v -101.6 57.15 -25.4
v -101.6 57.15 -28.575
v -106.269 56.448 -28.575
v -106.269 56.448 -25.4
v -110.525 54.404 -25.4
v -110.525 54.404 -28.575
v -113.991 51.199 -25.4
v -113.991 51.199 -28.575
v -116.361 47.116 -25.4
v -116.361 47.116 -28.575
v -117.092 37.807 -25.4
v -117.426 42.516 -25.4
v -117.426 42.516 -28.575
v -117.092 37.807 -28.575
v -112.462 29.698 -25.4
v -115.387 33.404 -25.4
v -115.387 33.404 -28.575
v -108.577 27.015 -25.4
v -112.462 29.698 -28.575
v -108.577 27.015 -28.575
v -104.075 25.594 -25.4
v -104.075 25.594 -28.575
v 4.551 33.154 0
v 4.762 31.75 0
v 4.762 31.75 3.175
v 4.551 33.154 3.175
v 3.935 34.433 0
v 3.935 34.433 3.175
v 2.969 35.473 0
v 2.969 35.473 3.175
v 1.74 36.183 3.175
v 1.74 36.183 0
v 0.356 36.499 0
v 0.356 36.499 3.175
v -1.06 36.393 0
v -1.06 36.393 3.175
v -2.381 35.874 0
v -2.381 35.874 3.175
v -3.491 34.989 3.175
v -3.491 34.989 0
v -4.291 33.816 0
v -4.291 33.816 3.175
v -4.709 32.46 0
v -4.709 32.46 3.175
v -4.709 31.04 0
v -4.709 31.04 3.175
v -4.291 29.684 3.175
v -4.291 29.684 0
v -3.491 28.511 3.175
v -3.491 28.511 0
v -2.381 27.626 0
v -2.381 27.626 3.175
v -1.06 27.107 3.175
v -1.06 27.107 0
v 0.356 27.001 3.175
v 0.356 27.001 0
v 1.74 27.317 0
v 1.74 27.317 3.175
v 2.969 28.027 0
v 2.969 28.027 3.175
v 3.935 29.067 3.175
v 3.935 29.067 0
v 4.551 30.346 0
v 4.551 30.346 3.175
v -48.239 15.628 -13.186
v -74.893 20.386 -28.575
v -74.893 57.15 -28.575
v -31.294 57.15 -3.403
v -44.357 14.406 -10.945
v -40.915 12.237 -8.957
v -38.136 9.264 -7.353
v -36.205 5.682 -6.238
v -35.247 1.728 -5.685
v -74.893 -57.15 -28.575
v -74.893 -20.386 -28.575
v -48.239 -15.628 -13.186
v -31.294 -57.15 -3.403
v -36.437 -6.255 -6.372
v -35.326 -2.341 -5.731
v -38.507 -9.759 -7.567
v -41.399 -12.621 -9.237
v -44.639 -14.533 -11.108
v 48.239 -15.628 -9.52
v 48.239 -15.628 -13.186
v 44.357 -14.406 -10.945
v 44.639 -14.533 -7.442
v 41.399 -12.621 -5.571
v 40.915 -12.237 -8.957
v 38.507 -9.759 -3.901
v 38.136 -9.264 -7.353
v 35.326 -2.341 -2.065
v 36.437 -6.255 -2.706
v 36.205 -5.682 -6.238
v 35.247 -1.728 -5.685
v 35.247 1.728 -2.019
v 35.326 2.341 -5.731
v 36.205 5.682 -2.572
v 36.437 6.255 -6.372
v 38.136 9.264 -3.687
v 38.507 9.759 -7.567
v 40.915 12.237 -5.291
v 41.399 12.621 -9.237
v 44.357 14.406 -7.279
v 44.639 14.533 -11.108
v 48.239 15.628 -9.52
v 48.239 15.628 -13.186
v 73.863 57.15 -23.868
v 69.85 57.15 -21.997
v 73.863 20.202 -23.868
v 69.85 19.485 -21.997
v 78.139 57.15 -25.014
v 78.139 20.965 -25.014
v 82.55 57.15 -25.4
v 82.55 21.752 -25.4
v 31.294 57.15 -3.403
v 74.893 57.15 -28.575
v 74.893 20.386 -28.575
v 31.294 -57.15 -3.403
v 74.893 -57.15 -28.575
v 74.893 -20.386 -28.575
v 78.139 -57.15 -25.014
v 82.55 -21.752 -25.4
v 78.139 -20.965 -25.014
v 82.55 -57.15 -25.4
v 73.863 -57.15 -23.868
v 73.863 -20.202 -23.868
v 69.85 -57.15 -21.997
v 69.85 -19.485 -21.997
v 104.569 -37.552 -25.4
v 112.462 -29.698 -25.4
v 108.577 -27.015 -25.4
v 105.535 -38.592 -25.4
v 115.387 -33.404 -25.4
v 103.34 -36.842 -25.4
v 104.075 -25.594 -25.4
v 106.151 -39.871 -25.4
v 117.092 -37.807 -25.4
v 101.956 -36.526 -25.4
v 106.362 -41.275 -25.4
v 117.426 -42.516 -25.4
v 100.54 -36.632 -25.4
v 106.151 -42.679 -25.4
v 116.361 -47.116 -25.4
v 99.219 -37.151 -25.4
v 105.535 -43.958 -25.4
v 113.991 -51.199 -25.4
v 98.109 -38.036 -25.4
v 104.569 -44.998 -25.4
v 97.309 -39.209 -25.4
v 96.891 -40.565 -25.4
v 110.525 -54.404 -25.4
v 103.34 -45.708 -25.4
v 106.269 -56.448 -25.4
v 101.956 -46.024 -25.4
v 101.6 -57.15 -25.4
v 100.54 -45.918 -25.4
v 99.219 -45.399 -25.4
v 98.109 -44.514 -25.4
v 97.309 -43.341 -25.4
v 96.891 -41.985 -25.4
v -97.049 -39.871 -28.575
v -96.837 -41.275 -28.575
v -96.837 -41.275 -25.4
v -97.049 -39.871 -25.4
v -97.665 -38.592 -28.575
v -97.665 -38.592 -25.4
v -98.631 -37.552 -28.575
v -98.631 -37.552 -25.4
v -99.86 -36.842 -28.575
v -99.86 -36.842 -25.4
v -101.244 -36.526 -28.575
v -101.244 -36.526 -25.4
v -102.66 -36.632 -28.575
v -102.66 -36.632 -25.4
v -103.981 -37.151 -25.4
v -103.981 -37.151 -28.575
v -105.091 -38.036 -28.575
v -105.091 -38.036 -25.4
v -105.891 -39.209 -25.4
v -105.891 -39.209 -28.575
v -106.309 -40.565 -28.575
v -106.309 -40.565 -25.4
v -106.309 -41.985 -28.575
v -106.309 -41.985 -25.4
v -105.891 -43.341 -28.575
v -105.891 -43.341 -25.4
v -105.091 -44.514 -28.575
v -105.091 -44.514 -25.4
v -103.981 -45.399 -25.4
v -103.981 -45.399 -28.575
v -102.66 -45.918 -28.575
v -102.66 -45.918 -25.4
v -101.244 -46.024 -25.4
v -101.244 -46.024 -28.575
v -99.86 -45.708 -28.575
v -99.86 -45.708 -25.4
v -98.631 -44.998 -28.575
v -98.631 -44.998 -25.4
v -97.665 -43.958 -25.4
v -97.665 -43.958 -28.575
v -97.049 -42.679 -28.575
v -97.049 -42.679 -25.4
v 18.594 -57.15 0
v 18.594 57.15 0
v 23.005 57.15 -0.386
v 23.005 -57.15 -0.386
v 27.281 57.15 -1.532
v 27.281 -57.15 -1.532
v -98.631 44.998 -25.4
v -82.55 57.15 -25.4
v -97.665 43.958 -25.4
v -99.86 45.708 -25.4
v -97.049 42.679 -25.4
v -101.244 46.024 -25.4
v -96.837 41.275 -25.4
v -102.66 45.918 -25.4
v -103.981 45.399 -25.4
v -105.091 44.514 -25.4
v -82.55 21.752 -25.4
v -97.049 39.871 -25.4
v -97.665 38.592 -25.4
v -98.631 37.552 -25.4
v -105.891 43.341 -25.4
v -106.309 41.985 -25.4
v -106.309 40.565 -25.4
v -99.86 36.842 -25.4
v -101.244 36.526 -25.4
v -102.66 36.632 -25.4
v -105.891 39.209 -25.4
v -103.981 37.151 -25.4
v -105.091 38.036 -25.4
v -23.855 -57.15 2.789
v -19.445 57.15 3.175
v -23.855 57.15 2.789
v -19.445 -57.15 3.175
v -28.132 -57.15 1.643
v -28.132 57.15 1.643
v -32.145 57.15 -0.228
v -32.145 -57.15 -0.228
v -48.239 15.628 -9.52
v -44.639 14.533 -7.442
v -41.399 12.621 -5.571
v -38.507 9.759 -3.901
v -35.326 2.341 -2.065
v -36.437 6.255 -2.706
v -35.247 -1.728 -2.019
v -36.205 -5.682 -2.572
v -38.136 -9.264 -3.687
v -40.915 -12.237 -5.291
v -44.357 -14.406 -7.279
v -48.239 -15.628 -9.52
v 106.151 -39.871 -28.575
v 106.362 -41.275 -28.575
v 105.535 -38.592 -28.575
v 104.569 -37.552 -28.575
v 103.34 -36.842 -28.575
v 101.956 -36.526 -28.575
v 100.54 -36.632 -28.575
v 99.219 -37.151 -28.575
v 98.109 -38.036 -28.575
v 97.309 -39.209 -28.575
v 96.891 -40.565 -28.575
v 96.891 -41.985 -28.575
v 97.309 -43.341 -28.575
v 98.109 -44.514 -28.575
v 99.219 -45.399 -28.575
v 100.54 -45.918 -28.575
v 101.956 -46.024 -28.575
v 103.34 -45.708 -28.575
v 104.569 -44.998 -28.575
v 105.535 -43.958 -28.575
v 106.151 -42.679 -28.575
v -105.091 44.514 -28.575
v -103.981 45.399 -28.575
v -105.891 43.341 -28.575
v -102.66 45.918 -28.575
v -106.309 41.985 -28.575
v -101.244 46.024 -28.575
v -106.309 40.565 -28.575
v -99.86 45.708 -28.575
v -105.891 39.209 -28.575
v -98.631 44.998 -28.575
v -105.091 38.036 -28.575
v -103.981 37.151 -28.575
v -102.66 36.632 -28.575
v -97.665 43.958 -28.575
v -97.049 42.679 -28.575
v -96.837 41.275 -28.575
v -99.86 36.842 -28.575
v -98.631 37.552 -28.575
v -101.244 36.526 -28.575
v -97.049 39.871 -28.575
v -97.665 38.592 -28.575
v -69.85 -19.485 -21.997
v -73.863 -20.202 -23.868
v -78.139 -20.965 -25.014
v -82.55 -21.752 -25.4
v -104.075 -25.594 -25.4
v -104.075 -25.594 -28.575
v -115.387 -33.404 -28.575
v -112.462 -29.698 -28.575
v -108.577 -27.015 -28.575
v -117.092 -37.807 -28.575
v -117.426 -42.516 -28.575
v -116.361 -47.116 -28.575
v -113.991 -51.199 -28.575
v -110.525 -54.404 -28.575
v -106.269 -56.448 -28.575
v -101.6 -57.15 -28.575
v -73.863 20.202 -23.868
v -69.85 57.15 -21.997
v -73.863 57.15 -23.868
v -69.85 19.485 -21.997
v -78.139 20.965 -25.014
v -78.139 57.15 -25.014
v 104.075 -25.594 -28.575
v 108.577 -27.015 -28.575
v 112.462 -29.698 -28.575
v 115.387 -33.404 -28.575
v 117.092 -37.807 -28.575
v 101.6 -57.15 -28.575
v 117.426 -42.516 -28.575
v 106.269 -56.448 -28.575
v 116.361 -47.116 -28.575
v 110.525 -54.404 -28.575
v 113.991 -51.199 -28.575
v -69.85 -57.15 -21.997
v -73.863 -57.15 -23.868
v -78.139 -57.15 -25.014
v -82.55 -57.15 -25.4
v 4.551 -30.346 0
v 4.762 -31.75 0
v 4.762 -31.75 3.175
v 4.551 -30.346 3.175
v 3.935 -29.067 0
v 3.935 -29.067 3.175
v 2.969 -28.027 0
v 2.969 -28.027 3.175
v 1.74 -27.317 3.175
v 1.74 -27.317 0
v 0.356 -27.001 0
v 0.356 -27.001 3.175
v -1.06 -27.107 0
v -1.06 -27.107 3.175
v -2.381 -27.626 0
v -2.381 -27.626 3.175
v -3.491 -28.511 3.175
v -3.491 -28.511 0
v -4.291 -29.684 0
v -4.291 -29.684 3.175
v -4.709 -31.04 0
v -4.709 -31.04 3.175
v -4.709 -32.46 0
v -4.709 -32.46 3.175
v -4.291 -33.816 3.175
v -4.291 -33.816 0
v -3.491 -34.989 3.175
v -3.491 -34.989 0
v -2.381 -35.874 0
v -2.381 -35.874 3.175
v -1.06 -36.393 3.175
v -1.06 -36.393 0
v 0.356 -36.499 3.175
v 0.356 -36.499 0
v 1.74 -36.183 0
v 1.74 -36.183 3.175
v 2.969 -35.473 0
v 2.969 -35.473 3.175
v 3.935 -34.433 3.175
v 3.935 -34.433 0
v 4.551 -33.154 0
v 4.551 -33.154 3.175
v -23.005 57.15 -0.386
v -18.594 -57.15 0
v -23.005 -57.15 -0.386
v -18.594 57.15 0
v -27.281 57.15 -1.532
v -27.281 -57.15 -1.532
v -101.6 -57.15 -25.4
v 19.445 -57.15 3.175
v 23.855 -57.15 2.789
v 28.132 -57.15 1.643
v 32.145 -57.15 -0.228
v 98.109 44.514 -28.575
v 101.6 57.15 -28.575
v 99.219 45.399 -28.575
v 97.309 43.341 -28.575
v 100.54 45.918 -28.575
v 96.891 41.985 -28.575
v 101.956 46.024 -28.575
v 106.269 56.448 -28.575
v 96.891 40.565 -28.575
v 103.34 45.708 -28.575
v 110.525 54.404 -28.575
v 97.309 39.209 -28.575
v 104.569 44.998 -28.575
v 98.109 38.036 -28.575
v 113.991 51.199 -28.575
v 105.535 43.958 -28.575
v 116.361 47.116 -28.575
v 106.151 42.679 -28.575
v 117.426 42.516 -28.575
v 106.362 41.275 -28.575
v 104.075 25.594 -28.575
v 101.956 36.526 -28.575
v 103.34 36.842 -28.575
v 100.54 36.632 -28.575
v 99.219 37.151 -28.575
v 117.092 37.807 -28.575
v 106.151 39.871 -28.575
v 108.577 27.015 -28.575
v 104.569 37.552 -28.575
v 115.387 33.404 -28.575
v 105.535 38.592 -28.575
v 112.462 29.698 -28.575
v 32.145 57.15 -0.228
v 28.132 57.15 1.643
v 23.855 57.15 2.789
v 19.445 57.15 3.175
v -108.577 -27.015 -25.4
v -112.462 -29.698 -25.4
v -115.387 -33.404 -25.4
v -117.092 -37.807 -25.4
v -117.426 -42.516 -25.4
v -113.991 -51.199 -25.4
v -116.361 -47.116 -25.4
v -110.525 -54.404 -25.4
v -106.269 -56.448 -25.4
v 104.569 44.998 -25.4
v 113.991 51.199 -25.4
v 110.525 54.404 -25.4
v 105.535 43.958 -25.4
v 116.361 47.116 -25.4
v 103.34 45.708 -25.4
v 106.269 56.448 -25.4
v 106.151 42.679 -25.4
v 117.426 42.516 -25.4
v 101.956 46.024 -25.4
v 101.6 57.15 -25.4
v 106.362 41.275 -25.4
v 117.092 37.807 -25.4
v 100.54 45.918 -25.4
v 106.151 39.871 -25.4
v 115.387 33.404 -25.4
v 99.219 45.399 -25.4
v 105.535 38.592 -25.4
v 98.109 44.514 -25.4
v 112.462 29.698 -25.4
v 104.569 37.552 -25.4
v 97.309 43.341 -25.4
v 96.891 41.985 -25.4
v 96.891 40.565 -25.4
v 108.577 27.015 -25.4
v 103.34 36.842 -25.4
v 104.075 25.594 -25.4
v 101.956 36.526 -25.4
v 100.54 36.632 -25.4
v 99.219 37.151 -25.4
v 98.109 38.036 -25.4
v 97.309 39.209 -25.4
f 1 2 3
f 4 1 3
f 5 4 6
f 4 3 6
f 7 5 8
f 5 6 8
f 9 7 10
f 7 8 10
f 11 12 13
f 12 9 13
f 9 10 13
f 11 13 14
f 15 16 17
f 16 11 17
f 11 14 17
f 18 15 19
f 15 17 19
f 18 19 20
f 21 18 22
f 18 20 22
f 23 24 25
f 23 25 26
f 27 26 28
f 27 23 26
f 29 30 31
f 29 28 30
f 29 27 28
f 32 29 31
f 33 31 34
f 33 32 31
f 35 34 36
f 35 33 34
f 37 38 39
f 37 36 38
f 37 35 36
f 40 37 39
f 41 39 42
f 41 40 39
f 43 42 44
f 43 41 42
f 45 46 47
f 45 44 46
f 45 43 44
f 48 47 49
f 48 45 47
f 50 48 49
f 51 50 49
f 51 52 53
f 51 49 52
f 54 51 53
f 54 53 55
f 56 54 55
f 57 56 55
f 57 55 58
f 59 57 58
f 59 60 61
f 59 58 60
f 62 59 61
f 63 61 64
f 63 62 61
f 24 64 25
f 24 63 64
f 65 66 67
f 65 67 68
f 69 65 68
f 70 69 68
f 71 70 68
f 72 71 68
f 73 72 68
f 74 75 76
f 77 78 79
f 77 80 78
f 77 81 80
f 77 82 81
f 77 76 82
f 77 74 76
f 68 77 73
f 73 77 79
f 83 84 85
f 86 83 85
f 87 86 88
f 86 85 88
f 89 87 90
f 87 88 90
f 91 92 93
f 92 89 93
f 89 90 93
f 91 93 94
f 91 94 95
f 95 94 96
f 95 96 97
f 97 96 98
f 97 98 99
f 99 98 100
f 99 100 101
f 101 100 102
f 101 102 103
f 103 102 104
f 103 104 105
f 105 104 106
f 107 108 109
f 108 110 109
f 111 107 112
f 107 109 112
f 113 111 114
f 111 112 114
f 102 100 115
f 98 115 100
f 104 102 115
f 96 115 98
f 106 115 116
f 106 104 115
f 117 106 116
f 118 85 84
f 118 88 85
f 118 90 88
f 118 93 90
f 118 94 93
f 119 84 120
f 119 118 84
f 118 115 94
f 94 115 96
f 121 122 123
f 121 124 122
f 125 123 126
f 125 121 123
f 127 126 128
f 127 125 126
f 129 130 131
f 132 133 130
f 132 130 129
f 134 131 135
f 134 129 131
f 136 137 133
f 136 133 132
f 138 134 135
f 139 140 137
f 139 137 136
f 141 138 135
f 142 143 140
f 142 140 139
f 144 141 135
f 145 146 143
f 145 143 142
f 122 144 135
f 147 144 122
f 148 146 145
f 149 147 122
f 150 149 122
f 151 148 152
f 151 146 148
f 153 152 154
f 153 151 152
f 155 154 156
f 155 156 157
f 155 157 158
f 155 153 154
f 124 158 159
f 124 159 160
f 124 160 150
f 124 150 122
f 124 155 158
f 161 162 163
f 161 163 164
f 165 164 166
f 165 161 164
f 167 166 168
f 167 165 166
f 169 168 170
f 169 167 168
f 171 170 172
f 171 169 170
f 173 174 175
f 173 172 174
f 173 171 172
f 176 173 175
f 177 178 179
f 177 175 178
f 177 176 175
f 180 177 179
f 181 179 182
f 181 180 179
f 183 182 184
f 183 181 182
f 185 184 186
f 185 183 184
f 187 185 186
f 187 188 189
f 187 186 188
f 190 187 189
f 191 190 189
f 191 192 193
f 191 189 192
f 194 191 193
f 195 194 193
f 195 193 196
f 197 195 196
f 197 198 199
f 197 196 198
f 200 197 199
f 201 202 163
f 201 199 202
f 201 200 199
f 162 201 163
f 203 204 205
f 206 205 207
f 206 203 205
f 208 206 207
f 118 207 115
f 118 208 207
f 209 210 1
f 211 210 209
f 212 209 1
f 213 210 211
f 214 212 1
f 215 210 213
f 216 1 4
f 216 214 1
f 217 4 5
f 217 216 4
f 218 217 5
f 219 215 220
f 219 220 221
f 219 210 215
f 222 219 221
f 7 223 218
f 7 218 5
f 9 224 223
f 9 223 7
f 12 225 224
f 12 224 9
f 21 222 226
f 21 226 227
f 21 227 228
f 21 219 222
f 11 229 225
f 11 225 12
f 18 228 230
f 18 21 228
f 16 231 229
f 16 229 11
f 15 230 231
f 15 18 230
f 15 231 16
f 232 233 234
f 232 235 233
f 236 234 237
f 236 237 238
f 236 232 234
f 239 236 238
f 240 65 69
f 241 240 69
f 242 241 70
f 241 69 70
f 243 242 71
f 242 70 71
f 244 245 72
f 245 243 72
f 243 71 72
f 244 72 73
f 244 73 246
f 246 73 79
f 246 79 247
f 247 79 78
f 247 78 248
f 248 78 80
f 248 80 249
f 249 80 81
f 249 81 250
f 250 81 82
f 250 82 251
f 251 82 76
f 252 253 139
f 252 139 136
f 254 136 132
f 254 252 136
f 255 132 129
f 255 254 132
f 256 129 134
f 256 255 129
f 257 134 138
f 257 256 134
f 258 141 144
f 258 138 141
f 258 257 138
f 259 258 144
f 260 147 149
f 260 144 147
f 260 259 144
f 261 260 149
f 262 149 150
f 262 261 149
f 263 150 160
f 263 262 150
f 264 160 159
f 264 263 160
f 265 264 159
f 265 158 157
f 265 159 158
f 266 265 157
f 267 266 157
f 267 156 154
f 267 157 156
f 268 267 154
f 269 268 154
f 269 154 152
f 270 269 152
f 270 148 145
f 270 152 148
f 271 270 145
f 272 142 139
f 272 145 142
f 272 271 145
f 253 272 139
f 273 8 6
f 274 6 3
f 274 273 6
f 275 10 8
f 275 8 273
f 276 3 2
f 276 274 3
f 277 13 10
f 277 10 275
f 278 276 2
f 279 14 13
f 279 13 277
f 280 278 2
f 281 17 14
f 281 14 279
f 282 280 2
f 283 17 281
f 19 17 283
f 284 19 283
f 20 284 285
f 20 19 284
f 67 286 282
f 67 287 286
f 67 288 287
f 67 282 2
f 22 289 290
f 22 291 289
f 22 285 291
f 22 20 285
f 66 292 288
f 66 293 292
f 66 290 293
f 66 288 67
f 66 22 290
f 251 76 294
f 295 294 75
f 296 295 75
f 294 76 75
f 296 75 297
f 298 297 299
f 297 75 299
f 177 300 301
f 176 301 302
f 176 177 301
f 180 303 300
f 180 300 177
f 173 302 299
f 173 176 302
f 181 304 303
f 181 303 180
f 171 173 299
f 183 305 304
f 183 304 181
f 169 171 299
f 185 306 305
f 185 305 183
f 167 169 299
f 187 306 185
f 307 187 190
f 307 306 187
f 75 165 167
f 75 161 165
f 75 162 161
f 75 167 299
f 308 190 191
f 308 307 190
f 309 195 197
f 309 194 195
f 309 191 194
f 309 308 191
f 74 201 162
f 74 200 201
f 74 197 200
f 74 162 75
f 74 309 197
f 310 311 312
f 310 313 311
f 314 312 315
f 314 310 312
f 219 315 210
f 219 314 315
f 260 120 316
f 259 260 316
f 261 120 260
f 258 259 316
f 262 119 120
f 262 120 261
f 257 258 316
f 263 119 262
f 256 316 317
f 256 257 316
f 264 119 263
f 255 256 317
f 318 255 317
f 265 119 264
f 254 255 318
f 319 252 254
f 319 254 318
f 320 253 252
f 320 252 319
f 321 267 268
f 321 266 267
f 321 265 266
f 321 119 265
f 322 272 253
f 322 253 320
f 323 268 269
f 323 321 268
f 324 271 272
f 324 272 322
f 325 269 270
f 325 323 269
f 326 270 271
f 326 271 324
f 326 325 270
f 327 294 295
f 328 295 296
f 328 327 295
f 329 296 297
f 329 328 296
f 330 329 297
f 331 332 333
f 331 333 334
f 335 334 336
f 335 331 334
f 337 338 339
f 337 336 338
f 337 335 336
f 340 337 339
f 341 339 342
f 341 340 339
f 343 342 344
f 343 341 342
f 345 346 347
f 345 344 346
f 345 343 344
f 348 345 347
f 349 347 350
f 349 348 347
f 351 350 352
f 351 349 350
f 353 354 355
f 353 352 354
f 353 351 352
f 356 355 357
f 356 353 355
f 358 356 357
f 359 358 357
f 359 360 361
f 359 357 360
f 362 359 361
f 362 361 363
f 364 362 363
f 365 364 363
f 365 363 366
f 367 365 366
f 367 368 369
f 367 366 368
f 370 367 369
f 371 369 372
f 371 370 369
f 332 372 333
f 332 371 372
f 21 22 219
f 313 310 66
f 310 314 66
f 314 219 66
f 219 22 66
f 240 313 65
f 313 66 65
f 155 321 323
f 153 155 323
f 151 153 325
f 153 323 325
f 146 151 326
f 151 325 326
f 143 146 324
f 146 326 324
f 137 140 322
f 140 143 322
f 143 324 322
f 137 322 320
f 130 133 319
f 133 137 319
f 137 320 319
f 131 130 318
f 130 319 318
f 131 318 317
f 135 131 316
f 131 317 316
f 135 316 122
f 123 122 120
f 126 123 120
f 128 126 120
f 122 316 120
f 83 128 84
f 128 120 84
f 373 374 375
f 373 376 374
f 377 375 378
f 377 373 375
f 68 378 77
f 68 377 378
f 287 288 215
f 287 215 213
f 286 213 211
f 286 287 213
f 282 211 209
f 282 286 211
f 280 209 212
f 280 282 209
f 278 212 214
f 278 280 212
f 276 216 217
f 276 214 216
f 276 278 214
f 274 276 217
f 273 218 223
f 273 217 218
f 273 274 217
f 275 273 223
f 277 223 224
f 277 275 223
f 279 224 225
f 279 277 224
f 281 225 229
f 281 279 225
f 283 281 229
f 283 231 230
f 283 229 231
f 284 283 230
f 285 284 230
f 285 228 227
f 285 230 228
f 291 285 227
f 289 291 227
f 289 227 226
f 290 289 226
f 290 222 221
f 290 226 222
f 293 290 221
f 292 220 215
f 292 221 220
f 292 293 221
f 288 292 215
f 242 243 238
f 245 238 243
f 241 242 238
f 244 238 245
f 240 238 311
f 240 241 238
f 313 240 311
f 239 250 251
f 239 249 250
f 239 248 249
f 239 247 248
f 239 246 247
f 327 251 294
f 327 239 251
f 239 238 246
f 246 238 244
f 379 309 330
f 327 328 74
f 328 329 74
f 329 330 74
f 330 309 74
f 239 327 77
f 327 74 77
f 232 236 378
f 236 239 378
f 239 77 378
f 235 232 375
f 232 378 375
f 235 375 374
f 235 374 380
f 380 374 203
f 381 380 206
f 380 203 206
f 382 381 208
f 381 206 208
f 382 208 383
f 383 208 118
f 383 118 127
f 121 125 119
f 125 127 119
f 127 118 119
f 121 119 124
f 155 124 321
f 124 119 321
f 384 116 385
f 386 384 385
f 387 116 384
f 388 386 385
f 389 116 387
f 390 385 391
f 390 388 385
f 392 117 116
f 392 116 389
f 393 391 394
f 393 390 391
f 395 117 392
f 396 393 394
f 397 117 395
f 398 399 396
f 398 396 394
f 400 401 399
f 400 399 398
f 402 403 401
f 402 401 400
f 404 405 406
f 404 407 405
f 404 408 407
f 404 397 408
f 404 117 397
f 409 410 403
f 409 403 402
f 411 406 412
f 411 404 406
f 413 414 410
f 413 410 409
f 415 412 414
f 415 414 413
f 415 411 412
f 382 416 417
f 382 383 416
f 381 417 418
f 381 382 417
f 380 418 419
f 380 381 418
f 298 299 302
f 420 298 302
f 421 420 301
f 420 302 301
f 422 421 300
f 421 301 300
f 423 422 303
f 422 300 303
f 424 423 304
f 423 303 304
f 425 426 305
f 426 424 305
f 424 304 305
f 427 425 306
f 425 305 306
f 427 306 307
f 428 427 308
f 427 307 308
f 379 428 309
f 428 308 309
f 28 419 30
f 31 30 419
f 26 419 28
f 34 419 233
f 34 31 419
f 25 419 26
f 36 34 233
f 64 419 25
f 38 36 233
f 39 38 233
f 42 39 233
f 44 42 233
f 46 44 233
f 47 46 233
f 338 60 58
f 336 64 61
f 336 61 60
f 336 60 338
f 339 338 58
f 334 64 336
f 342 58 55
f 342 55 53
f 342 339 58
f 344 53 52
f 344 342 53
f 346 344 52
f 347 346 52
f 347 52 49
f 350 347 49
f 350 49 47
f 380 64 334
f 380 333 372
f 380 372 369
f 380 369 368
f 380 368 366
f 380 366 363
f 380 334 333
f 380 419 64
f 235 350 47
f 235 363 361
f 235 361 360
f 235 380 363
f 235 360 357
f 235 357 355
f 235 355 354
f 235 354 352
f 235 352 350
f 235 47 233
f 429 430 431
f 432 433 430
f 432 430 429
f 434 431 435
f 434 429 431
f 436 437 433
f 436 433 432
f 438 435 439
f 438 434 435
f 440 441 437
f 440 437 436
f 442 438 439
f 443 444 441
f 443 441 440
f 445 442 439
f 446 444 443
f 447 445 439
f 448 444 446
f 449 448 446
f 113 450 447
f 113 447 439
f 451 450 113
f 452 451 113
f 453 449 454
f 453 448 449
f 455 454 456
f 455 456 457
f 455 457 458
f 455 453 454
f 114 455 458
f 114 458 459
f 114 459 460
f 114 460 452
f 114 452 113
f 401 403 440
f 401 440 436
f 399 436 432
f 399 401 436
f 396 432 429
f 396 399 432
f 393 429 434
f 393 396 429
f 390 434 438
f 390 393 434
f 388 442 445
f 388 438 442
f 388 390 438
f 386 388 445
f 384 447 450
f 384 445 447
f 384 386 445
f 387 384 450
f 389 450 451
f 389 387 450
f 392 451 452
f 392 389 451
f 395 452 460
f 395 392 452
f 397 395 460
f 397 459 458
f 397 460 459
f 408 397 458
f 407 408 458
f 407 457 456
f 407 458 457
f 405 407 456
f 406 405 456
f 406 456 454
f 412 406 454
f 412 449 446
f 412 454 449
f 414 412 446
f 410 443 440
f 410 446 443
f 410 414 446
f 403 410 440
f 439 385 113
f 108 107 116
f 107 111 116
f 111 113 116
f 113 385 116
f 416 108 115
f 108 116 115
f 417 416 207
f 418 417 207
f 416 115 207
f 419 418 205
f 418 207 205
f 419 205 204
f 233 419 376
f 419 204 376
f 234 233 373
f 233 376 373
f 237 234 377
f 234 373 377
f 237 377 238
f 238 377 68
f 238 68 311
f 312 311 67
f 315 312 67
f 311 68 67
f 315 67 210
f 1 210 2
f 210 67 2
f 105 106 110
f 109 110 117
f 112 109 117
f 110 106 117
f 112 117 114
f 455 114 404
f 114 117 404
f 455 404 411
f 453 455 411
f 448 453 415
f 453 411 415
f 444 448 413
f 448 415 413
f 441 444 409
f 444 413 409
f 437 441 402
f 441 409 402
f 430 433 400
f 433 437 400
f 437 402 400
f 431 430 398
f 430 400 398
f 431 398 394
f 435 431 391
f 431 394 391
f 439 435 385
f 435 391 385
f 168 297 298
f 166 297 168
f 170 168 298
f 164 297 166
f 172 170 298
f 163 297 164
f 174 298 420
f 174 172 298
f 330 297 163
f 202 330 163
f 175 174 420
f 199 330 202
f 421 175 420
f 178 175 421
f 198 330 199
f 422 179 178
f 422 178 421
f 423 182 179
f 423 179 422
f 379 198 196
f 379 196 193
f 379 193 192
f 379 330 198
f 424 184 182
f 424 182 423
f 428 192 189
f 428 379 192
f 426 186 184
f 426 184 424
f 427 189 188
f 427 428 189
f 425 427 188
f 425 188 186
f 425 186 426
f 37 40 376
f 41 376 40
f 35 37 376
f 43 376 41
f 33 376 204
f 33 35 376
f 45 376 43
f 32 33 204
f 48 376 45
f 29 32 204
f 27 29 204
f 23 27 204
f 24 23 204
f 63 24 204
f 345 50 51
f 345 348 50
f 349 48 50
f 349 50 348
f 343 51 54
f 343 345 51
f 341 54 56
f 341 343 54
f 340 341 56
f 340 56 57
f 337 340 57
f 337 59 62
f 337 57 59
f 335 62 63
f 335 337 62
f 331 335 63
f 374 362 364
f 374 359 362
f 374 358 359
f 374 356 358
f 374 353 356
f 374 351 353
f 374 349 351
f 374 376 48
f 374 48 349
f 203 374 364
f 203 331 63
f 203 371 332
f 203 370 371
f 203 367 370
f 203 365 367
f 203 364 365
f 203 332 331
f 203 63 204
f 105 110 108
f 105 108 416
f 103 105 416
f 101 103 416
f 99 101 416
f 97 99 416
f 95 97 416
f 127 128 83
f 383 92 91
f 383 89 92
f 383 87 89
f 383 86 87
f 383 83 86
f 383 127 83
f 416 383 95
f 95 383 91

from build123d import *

# Parameters (mm, degrees)
F1_DEPTH      = 63.5
F1_DEPTH_BACK = 74.676
F3_START      = -145.542
F2_R          = 4.7625
F3_DEPTH      = 250.19
F4_R          = 25.4


with BuildPart() as f1:
    # F0 (on Front) → F1 (new body, two sides)
    with BuildSketch(Plane.XZ) as f1_sk:
        Polygon((-25.4, 0), (0, 0), (25.4, 0), (74.8933518263, -28.575), (127, -28.575), (127, -25.4), (75.7440905122, -25.4), (26.250738686, 3.175), (0, 3.175), (-26.250738686, 3.175), (-75.7440905122, -25.4), (-127, -25.4), (-127, -28.575), (-74.8933518263, -28.575), align=None)
    extrude(amount=F1_DEPTH)
    extrude(f1_sk.sketch, amount=-F1_DEPTH_BACK)

    # F2 (on Top) → F3 (intersect)
    with BuildSketch(Plane.XY.offset(F3_START)):
        with BuildLine():
            ThreePointArc((-104.0748523501, -25.594096619), (-117.4264014573, -42.5162259718), (-101.6, -57.15))
            Line((-101.6, -57.15), (0, -57.15))
            Line((0, -57.15), (101.6, -57.15))
            ThreePointArc((101.6, -57.15), (117.4264014573, -42.5162259718), (104.0748523501, -25.594096619))
            Line((104.0748523501, -25.594096619), (48.2385059171, -15.6280150973))
            ThreePointArc((48.2385059171, -15.6280150973), (35.1529089212, 0), (48.2385059171, 15.6280150973))
            Line((48.2385059171, 15.6280150973), (104.0748523501, 25.594096619))
            ThreePointArc((104.0748523501, 25.594096619), (117.4264014573, 42.5162259718), (101.6, 57.15))
            Line((101.6, 57.15), (0, 57.15))
            Line((0, 57.15), (-101.6, 57.15))
            ThreePointArc((-101.6, 57.15), (-117.4264014573, 42.5162259718), (-104.0748523501, 25.594096619))
            Line((-104.0748523501, 25.594096619), (-48.2385059171, 15.6280150973))
            ThreePointArc((-48.2385059171, 15.6280150973), (-35.1529089212, 0), (-48.2385059171, -15.6280150973))
            Line((-48.2385059171, -15.6280150973), (-104.0748523501, -25.594096619))
        make_face()
        with Locations((-101.6, -41.275)):
            Circle(F2_R, mode=Mode.SUBTRACT)
        with Locations((0, -31.75)):
            Circle(F2_R, mode=Mode.SUBTRACT)
        with Locations((101.6, -41.275)):
            Circle(F2_R, mode=Mode.SUBTRACT)
        with Locations((-101.6, 41.275)):
            Circle(F2_R, mode=Mode.SUBTRACT)
        with Locations((0, 31.75)):
            Circle(F2_R, mode=Mode.SUBTRACT)
        with Locations((101.6, 41.275)):
            Circle(F2_R, mode=Mode.SUBTRACT)
    extrude(amount=F3_DEPTH, mode=Mode.INTERSECT)

    # F4
    f4_edges = [f1.edges().sort_by_distance(p)[0] for p in [
        (-75.744091, -38.843707, -25.4),
        (-75.744091, 38.843707, -25.4),
        (-26.250739, 0, 3.175),
        (26.250739, 0, 3.175),
        (75.744091, -38.843707, -25.4),
        (75.744091, 38.843707, -25.4),
        (-25.4, 0, 0),
        (25.4, 0, 0),
    ]]
    fillet(f4_edges, radius=F4_R)


solid = f1.part
